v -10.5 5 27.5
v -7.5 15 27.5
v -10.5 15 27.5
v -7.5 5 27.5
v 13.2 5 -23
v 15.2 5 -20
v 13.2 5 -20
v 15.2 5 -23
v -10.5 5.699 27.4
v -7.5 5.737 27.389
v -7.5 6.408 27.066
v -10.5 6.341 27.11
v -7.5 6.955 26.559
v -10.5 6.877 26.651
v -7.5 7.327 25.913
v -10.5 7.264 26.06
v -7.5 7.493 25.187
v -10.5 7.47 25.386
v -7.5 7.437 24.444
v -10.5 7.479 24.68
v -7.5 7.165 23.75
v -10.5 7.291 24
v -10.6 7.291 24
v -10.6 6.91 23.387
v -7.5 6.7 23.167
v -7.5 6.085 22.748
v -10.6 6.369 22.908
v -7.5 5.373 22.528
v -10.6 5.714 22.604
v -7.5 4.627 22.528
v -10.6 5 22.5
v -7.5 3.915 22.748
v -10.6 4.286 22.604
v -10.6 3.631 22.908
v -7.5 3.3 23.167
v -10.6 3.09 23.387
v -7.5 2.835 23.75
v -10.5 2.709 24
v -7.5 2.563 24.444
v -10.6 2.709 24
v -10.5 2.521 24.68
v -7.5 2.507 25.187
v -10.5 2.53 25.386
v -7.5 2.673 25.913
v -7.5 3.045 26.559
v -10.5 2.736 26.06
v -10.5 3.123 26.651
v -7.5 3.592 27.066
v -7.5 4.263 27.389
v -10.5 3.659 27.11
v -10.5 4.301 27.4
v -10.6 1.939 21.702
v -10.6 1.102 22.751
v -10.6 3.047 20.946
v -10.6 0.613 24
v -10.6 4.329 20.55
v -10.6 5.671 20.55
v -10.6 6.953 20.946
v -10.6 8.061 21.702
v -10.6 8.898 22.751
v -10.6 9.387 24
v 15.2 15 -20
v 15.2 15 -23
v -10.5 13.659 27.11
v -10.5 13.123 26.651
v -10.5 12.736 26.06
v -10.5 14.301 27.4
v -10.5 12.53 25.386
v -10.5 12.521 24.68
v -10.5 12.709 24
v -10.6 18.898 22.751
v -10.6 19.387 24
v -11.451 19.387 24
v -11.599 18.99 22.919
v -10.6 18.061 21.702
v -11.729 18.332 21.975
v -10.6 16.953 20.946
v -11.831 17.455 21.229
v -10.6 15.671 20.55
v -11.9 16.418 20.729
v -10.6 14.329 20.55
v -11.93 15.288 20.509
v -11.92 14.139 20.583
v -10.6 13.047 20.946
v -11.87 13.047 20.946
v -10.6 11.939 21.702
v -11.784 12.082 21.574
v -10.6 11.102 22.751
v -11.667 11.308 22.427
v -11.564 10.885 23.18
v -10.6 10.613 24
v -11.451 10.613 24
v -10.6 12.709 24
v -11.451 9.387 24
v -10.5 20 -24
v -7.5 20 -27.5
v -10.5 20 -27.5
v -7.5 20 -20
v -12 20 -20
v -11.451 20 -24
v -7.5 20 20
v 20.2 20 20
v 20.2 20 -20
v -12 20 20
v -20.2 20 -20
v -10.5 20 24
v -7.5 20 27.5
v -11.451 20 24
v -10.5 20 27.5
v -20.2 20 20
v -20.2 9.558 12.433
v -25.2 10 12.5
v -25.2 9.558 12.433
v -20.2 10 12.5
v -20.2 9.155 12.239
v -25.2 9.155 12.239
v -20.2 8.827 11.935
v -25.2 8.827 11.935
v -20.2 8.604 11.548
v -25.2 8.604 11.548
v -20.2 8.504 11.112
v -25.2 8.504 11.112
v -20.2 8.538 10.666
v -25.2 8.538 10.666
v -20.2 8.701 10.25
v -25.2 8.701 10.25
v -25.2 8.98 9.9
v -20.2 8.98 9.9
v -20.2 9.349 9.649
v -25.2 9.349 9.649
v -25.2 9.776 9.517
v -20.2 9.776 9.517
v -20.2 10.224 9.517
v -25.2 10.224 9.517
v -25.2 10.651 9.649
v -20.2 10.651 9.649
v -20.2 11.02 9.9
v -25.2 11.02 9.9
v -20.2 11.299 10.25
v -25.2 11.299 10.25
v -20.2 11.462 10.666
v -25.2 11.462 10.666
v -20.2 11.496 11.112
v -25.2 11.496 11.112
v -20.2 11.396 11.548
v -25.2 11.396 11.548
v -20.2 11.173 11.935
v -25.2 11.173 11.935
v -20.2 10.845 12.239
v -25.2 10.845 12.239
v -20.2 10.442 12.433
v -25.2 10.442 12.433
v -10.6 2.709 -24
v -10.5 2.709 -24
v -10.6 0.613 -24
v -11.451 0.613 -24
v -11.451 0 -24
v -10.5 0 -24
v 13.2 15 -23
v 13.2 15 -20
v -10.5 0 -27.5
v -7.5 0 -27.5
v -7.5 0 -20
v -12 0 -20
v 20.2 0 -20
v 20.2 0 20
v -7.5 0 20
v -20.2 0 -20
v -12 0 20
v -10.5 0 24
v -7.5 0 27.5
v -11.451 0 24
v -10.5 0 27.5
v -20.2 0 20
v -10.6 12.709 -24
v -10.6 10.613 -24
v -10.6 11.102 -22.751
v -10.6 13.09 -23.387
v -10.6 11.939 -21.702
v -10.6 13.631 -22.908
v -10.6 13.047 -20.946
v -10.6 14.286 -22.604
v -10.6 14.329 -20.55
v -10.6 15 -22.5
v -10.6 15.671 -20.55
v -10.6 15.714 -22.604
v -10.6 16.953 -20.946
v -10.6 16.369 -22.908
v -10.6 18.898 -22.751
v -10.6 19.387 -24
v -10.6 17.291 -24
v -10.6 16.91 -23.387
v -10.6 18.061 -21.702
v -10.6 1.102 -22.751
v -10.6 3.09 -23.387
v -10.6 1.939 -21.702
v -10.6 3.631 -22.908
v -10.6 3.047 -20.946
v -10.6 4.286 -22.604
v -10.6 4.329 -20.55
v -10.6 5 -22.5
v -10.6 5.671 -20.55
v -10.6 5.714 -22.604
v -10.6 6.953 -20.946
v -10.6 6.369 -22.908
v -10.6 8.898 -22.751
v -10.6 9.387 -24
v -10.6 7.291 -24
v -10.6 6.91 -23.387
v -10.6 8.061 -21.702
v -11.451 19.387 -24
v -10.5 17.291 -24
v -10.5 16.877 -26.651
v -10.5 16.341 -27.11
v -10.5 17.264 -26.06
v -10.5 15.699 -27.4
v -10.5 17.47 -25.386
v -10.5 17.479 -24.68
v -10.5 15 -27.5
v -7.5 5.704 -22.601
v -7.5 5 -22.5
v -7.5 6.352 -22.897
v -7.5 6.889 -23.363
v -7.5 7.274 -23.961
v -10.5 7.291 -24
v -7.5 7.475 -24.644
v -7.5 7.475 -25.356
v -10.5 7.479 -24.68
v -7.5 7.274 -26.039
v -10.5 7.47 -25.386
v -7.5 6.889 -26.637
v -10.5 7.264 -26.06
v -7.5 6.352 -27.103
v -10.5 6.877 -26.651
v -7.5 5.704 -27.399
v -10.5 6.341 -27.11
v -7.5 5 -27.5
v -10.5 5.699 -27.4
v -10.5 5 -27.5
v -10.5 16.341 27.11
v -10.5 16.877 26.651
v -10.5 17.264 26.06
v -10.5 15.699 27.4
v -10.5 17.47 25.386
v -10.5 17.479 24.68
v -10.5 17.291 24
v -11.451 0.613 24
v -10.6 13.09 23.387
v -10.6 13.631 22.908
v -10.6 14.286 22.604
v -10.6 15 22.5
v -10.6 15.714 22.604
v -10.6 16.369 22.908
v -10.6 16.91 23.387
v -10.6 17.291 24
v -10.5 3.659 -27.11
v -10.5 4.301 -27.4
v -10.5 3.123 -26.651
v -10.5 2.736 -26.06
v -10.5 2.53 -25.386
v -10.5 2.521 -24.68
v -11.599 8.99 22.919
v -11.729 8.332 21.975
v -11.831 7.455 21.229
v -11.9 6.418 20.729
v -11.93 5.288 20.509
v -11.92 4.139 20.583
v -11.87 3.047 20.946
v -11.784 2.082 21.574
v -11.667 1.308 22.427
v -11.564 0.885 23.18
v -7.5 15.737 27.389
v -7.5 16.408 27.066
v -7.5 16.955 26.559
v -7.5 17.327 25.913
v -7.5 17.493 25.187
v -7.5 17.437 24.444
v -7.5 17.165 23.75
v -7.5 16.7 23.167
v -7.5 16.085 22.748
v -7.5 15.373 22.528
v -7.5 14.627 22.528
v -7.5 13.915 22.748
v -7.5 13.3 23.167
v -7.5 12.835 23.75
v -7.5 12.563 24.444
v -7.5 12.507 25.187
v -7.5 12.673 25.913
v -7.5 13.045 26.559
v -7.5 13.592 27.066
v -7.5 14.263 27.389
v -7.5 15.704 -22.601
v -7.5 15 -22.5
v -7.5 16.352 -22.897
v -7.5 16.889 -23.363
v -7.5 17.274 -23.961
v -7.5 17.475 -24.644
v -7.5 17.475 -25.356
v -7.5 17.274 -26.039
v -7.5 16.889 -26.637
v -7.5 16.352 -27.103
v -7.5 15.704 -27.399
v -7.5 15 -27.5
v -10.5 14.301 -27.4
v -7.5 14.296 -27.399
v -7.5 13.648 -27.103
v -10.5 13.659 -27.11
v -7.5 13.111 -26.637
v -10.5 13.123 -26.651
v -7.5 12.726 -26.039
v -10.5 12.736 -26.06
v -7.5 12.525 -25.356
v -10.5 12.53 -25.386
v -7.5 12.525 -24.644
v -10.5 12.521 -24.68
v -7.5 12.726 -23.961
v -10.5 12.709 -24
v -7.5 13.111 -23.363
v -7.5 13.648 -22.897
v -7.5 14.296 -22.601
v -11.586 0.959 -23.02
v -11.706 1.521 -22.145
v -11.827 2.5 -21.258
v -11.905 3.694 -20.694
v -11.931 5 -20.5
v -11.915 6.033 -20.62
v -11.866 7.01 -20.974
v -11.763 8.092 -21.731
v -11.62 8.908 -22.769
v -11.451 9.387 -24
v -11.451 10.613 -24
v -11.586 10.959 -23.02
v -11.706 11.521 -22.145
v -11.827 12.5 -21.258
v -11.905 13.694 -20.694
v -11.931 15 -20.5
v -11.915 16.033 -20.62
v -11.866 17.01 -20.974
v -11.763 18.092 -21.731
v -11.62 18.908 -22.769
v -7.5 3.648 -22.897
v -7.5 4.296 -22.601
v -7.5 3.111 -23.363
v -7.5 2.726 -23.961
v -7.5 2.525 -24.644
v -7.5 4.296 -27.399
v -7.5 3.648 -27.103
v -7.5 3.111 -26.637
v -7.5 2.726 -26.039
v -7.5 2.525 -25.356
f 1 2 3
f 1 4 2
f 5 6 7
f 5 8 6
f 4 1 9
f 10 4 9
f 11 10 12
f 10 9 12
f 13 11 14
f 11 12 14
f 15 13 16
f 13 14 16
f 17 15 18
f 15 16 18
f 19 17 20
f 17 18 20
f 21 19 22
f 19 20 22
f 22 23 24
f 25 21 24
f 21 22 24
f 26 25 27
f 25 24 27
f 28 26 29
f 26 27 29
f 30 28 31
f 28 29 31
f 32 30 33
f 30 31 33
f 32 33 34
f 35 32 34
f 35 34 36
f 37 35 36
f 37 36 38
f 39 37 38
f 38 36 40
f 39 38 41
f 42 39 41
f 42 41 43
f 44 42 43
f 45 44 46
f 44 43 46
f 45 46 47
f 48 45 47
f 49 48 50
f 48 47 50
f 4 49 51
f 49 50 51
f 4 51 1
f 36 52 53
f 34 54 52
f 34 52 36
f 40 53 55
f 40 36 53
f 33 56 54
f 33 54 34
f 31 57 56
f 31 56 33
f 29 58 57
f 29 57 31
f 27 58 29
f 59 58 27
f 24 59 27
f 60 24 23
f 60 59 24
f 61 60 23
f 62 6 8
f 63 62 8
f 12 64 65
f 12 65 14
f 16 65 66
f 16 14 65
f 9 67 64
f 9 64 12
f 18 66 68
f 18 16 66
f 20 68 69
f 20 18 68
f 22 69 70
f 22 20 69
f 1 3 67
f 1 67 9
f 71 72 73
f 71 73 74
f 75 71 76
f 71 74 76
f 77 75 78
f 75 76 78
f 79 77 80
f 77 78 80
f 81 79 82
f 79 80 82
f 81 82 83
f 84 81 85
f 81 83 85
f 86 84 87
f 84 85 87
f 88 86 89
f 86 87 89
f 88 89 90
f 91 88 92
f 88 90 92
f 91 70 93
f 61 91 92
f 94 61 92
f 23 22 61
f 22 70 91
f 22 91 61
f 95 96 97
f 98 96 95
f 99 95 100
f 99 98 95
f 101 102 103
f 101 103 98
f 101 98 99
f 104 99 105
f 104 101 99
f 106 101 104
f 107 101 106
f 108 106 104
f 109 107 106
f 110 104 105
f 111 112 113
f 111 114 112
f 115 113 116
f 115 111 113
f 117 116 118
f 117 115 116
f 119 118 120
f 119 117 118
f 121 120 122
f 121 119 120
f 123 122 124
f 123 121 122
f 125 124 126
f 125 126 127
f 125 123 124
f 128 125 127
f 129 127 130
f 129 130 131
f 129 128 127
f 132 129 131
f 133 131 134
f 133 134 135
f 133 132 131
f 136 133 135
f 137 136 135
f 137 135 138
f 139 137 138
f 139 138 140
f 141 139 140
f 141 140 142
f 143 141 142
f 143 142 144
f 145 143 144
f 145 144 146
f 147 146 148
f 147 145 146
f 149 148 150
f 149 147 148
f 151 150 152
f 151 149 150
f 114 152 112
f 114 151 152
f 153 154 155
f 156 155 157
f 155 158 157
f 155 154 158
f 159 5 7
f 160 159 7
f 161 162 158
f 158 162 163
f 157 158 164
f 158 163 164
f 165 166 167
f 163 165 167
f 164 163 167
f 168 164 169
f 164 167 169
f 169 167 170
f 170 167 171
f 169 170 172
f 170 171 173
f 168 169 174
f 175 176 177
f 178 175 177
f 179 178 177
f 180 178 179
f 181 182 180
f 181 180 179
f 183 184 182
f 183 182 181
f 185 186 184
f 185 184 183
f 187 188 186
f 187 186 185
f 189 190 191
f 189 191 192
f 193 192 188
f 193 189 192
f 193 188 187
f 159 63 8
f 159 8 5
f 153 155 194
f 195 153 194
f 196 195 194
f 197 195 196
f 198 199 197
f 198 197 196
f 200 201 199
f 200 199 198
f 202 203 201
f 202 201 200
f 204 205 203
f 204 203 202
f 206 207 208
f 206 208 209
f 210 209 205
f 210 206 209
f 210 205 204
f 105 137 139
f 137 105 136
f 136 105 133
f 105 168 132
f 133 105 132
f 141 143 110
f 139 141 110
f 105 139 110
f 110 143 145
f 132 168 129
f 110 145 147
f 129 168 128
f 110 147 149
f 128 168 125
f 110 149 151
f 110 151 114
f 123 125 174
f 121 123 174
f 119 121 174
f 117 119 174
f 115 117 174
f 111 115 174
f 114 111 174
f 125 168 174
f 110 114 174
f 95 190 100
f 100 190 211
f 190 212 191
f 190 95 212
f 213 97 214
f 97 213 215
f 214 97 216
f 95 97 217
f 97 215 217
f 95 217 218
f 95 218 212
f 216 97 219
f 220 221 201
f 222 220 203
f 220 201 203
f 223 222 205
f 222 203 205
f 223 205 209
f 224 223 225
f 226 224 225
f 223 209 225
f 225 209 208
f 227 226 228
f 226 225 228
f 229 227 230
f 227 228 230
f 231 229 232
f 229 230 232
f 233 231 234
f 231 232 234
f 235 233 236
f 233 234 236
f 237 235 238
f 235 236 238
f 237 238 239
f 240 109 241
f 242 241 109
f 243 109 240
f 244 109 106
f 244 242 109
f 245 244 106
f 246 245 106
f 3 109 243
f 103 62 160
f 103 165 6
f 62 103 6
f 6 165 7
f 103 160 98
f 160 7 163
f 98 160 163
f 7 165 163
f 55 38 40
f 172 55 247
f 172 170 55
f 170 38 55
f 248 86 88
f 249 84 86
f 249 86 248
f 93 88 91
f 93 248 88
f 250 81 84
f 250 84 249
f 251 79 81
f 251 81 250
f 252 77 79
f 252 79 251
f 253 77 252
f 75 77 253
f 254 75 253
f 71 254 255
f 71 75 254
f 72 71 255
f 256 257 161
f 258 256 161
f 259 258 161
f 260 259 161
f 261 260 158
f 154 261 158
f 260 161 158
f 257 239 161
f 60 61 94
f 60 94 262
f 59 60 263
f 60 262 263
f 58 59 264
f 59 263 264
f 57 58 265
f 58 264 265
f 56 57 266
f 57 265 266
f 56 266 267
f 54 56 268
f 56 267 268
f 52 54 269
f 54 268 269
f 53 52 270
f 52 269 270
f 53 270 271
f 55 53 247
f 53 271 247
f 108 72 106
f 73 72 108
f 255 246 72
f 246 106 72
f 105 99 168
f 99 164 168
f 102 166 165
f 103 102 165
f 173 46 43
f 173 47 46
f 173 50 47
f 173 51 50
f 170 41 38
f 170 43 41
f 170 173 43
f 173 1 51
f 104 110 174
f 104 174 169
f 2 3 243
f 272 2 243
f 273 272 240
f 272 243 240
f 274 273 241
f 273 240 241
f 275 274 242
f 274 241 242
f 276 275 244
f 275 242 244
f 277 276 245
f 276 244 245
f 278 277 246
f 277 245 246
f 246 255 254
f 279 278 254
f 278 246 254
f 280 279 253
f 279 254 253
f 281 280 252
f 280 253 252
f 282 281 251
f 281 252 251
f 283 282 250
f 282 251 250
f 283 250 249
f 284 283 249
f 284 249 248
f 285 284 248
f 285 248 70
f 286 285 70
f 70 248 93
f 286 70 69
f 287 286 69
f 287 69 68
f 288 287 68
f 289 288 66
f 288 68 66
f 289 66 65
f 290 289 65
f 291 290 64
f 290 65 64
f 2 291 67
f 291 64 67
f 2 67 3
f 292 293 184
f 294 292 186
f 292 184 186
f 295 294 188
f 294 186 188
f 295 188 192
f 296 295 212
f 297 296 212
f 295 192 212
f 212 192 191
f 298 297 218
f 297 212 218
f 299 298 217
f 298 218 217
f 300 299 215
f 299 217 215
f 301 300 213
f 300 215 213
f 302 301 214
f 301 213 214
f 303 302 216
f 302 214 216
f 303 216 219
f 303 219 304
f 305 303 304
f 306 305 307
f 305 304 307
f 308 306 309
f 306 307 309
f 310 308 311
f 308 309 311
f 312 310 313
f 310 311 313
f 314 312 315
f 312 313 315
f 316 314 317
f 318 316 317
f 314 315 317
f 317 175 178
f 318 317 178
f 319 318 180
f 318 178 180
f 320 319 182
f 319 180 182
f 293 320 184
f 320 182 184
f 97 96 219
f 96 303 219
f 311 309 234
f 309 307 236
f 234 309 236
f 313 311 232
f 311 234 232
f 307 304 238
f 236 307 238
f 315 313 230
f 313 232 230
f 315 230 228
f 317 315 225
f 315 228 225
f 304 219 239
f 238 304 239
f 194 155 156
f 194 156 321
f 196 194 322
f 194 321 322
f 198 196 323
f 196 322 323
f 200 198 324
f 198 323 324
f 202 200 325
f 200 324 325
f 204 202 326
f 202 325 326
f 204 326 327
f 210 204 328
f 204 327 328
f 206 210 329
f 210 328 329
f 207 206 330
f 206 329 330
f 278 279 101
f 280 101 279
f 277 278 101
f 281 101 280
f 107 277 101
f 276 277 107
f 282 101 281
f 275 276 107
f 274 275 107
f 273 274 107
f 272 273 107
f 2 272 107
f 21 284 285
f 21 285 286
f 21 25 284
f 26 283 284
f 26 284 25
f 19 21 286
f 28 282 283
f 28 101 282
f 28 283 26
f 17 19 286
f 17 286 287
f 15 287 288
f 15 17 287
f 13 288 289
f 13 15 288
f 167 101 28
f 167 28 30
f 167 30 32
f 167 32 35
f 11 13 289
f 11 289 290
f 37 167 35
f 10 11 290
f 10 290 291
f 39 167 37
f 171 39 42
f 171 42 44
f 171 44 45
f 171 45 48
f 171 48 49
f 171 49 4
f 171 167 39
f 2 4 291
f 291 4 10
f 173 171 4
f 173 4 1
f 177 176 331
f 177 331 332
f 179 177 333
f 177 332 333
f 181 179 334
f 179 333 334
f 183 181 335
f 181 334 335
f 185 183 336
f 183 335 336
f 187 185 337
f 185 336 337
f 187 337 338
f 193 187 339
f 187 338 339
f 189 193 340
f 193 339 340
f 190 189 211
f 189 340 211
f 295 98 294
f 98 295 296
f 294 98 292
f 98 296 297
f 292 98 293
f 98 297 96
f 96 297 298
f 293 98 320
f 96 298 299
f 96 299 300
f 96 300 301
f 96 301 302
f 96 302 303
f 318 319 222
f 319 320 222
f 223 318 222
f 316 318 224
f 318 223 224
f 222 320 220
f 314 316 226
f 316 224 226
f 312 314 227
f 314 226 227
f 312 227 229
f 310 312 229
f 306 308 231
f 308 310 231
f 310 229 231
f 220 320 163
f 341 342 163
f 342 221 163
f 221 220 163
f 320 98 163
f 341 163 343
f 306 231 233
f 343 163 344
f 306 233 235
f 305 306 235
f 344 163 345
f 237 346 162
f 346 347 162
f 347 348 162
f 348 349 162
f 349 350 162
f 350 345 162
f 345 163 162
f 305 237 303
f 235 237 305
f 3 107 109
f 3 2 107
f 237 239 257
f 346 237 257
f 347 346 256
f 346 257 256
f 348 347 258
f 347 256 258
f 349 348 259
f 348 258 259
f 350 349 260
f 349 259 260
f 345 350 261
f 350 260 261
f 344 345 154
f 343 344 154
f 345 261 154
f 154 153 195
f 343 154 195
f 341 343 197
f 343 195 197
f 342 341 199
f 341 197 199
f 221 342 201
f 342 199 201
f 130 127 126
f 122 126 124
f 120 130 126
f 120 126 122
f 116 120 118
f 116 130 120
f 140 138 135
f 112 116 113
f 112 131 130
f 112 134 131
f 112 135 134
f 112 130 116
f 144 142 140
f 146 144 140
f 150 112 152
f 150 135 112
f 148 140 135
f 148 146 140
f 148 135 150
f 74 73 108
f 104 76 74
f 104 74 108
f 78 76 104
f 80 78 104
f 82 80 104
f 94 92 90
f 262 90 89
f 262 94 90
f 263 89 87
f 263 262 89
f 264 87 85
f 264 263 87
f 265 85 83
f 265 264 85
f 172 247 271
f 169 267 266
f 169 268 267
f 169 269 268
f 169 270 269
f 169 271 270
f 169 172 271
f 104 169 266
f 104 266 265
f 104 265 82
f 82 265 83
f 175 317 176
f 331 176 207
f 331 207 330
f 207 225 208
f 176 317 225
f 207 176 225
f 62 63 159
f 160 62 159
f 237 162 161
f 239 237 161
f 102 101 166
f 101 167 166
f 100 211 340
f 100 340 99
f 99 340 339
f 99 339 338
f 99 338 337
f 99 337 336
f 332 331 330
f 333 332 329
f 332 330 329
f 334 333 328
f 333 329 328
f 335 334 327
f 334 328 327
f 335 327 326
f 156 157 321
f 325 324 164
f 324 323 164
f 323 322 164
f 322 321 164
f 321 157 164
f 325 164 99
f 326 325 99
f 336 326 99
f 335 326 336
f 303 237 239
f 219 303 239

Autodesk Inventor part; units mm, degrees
ref_plane "YZ Plane" through (0, 0, 0) normal (1, 0, 0) x (0, 1, 0)
ref_plane "XZ Plane" through (0, 0, 0) normal (0, 1, 0) x (-1, 0, 0)
ref_plane "XY Plane" through (0, 0, 0) normal (0, 0, 1) x (1, 0, 0)
sketch "Sketch1" plane through (0, 0, 0) normal (0, 1, 0) x (-1, 0, 0)
  line L0 (20.2, 20) -> (-20.2, 20)
  line L1 (-20.2, 20) -> (-20.2, -20)
  line L2 (-20.2, -20) -> (20.2, -20)
  line L3 (20.2, -20) -> (20.2, 20)
  line L4 (20.2, 20) -> (-20.2, -20) construction
  line L5 (-20.2, 20) -> (20.2, -20) construction
  line L6 (-20.2, 20) -> (7.5, 20)
  line L7 (7.5, 20) -> (7.5, 27.5)
  line L8 (7.5, 27.5) -> (10.5, 27.5)
  line L9 (10.5, 27.5) -> (10.5, 20)
  line L10 (10.5, 24) -> (11.4512, 24)
  line L11 (11.4512, 24) -> (12, 20)
  line L12 (20.2, 0) -> (-20.2, 0)
  line L13 (7.5, -20) -> (7.5, -27.5)
  line L14 (7.5, -27.5) -> (10.5, -27.5)
  line L15 (10.5, -27.5) -> (10.5, -20)
  line L16 (10.5, -24) -> (11.4512, -24)
  line L17 (11.4512, -24) -> (12, -20)
  line L18 (-20.2, -20) -> (-15.2, -20)
  line L19 (-15.2, -20) -> (-15.2, -23)
  line L20 (-15.2, -23) -> (-13.2, -23)
  line L21 (-13.2, -23) -> (-13.2, -20)
  point P0 (0, 0)
  dimension "d0" = 40.4
  dimension "d1" = 40
  dimension "d2" = 27.7
  dimension "d3" = 7.5
  dimension "d4" = 3
  dimension "d5" = 5
  dimension "d6" = 2
extrude "Extrusion1" add sketch "Sketch1" along normal blind 20
sketch "Sketch3" plane through (-20.2, 0, -20) normal (-1, 0, 0) x (0, 0, 1)
  circle A0 centre (31, 10) radius 1.5
  line L0 (47.5, 0) -> (47.5, 20) projected
  line L1 (47.5, 10) -> (-7.5, 10)
  line L2 (-7.5, 0) -> (-7.5, 20) projected
  line L3 (20, 0) -> (20, 20)
  line L4 (0, 20) -> (40, 20) projected
  circle A1 centre (45, 5) radius 2.5
  circle A2 centre (45, 15) radius 2.5
  circle A3 centre (-5, 5) radius 2.5
  circle A4 centre (-5, 15) radius 2.5
  line L5 (45, 5) -> (45, 5)
  dimension "d24" = 0
sketch "Sketch4" plane through (15.2, 0, -23) normal (0, 0, -1) x (-1, 0, 0)
  line L0 (0, 0) -> (0, 20) projected
  line L1 (4, 25) -> (0, 25)
  line L2 (0, 25) -> (0, 15)
  line L3 (0, 15) -> (4, 15)
  line L4 (4, 15) -> (4, 25)
  line L5 (2, 0) -> (2, 20) projected
  line L6 (4, 25) -> (0, 15) construction
  line L7 (0, 25) -> (4, 15) construction
  line L8 (4, -5) -> (0, -5)
  line L9 (0, -5) -> (0, 5)
  line L10 (0, 5) -> (4, 5)
  line L11 (4, 5) -> (4, -5)
  line L12 (4, -5) -> (0, 5) construction
  line L13 (0, -5) -> (4, 5) construction
  point P0 (15.2, 0)
extrude "Extrusion4" cut sketch "Sketch4" against normal blind 3 contours L0 L10 L11 L8 L9 | L0 L2 L1 L4 L3
extrude "Extrusion5" cut sketch "Sketch3" against normal blind 15 contours A3 | A4 | A2 | A1
extrude "Extrusion6" add sketch "Sketch3" along normal blind 5 contours L1 A0 | A0 L1
thread "Thread1" size "M5x0.8" class "6H" standard "ANSI Metric M Profile" full length
thread "Thread2" size "M5x0.8" class "6H" standard "ANSI Metric M Profile" full length
thread "Thread3" size "M5x0.8" class "6H" standard "ANSI Metric M Profile" full length
thread "Thread4" size "M5x0.8" class "6H" standard "ANSI Metric M Profile" full length
sketch "Sketch5" plane through (-20.2, 0, -20) normal (-1, 0, 0) x (0, 0, 1)
  circle A0 centre (45, 15) radius 4.5
  circle A1 centre (45, 5) radius 4.5
  circle A2 centre (-5, 5) radius 2.5 projected
  circle A3 centre (-5, 5) radius 4.5
  circle A4 centre (-5, 15) radius 2.5 projected
  circle A5 centre (-5, 15) radius 4.5
  point P0 (20, 0)
  point P1 (-7.5, 5)
  point P2 (-7.5, 15)
  dimension "d33" = 9
  dimension "d34" = 9
  dimension "d35" = 9
  dimension "d36" = 9
extrude "Extrusion7" cut sketch "Sketch5" against normal blind 9.6 contours A0 | A1 | A2 | A3 | A5
properties part number "Servo"
